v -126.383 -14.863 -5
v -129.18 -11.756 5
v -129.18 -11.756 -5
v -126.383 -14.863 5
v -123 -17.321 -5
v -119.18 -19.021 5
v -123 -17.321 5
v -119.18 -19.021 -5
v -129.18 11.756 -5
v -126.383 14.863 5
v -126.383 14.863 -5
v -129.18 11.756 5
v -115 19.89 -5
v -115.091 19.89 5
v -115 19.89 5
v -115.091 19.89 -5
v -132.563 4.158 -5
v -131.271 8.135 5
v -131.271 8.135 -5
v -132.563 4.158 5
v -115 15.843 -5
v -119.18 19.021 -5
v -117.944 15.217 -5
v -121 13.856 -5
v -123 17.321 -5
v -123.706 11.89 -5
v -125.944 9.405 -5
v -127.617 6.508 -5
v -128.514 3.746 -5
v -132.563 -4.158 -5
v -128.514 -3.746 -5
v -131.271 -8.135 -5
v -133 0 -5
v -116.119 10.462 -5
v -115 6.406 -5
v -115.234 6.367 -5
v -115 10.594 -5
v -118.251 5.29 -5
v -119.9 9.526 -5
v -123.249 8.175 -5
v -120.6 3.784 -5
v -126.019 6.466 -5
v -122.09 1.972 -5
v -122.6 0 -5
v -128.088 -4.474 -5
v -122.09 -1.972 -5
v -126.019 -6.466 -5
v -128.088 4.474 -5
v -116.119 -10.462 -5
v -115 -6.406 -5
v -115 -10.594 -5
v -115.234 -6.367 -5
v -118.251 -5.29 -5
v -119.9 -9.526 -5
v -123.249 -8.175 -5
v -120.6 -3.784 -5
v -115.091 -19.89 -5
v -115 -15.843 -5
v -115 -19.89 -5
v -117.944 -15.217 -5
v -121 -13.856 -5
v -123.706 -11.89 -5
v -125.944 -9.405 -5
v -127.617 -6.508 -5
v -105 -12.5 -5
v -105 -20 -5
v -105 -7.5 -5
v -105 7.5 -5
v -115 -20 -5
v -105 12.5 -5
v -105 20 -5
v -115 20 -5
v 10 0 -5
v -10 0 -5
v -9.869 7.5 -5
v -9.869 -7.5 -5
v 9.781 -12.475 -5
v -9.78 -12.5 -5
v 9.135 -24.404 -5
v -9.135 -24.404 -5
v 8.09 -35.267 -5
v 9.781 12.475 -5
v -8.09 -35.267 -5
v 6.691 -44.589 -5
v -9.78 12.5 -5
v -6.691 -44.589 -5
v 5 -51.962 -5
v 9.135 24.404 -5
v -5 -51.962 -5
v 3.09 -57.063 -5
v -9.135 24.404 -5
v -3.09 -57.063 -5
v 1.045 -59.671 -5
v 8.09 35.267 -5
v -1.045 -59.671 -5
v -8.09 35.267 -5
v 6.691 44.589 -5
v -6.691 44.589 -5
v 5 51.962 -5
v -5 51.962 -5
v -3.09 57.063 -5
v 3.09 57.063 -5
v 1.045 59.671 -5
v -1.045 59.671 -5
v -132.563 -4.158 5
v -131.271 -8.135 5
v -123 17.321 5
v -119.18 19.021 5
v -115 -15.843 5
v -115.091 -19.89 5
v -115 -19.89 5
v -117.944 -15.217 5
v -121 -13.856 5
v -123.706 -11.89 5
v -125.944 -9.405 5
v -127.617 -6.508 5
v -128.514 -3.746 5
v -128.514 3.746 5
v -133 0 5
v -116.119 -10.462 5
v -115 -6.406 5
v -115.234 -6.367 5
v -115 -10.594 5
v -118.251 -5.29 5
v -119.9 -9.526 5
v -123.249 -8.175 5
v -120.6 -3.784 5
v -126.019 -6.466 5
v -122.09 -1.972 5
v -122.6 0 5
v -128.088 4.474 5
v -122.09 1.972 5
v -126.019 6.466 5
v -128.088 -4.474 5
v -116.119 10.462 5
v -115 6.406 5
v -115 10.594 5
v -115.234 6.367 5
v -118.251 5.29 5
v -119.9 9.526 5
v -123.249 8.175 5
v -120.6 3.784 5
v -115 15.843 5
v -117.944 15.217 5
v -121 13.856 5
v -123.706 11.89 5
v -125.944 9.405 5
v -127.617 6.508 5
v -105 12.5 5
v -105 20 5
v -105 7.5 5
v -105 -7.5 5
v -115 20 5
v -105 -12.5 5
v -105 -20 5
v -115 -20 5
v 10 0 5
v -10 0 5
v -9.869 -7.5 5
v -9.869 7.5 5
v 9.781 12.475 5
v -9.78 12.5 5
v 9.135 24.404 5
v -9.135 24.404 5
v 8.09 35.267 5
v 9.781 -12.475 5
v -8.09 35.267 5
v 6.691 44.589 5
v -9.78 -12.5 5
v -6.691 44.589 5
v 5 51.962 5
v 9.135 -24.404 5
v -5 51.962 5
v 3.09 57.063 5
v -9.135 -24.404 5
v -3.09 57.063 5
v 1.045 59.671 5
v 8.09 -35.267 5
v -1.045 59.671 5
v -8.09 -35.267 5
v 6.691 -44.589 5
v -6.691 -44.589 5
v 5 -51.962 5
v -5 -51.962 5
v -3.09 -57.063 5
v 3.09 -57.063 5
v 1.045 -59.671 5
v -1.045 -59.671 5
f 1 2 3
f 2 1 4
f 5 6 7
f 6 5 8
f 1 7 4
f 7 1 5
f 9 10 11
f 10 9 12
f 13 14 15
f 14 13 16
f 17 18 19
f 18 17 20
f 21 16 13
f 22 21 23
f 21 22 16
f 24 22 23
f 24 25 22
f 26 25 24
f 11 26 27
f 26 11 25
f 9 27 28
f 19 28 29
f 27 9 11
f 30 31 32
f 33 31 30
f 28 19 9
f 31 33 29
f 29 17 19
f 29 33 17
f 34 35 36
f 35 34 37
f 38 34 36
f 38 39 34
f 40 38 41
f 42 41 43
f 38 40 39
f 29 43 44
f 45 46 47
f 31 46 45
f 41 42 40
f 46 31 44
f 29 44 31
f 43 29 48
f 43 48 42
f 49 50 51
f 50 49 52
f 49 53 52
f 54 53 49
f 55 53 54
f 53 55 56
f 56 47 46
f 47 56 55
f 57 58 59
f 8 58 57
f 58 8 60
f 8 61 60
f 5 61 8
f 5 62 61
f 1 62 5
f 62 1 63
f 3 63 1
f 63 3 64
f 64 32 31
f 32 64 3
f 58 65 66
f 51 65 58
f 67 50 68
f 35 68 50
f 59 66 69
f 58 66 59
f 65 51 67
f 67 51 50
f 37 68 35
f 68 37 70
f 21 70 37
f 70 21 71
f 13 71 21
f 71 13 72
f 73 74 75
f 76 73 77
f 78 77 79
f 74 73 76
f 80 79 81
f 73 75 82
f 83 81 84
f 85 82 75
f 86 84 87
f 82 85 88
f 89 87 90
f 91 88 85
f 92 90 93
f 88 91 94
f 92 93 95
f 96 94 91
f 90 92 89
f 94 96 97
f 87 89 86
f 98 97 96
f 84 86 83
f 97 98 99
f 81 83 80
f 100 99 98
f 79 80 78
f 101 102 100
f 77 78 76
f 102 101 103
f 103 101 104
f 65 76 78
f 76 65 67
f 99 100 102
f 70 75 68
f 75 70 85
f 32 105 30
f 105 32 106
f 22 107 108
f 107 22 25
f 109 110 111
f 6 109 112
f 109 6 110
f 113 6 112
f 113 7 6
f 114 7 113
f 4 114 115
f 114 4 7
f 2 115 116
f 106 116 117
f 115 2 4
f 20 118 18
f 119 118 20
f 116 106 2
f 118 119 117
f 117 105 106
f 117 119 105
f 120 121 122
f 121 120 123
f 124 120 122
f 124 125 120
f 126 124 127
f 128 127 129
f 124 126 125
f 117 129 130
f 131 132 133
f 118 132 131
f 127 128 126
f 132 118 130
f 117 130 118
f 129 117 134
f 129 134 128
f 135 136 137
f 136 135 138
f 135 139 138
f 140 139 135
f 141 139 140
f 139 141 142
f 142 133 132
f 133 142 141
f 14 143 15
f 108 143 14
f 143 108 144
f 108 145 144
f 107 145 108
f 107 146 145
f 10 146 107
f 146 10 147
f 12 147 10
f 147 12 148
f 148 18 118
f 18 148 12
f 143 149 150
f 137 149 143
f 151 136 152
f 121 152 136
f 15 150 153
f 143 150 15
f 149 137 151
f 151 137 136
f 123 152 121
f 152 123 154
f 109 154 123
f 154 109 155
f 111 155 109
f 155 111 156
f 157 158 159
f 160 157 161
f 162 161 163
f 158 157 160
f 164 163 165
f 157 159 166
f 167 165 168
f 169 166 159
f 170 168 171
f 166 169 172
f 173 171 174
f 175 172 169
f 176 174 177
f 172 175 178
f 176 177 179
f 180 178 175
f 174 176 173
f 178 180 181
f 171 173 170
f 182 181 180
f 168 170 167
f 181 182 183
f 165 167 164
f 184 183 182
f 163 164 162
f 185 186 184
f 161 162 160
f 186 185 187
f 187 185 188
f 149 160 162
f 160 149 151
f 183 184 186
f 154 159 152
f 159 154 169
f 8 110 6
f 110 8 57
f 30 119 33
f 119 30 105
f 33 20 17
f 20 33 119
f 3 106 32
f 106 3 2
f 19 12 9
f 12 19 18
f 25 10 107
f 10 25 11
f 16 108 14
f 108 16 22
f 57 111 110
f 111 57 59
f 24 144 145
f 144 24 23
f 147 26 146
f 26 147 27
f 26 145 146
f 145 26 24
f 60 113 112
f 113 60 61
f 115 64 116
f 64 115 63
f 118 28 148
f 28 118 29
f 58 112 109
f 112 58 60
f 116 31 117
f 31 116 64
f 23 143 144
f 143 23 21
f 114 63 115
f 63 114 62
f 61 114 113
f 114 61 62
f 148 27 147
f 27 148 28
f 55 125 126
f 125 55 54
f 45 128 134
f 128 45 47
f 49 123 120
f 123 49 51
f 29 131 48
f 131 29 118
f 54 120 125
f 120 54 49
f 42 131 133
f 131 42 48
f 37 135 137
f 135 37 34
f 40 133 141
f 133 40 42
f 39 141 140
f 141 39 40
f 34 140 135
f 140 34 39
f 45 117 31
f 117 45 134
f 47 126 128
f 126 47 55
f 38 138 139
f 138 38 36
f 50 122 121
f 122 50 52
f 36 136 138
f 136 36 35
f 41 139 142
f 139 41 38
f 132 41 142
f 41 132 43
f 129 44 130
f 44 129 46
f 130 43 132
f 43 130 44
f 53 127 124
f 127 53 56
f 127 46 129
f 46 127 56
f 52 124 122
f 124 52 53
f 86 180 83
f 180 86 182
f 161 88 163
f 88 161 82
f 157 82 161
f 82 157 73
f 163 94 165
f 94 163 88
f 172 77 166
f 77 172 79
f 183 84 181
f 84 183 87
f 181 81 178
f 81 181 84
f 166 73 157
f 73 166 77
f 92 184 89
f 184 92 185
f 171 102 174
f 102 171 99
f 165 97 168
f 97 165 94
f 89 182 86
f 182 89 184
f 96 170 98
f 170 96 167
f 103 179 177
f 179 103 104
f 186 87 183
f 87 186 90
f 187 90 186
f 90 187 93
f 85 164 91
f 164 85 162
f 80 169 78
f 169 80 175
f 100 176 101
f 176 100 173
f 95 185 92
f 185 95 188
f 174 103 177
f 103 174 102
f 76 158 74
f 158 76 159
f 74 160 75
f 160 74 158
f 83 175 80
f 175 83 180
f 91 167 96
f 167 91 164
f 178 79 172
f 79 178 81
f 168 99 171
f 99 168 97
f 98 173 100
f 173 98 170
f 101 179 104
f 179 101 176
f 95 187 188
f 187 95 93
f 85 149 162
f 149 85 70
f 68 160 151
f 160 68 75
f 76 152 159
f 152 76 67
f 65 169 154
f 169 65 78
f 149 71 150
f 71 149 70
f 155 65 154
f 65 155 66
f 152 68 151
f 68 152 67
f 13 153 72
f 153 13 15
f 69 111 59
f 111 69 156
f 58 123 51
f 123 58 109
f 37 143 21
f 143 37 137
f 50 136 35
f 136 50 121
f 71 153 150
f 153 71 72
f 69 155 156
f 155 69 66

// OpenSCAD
module efes(h){
multmatrix(m = [ [1, 0, 0, 0],
                 [0, 6, 0, 0],
                 [0, 0, 1, 0],
                 [0, 0, 0,  1]
               ]) cylinder(h=h, r=10, center=true);
}
module ring(r,t,h){
	difference(){
		cylinder(h=h, r=r, center=true);
		cylinder(h=h, r=r-t, center=true);
		translate([r/2,0,0]) cube([r,2*r,h], center=true);
	}
}

module arc(r,t, w){
	multmatrix(m = [ [w, 0, 0, 0],
                 [0, 1, 0, 0],
                 [0, 0, 1, 0],
                 [0, 0, 0,  1]
               ])
	difference(){
		ring(r,t,10)
		color("red") translate([r/2,0,0]) cube([r,2*r,10], center=true);
	}
		
}
efes(10);
translate([-59,10,0])
cube([100,5,10], center=true);

translate([-59,-10,0])
cube([100,5,10], center=true);

translate([-113,0,0]) arc(20,4,1);

translate([-110,0,0]) cube([10,40,10], center=true);

translate([-110,0,0]) color("red") arc(11,4,1.8);
